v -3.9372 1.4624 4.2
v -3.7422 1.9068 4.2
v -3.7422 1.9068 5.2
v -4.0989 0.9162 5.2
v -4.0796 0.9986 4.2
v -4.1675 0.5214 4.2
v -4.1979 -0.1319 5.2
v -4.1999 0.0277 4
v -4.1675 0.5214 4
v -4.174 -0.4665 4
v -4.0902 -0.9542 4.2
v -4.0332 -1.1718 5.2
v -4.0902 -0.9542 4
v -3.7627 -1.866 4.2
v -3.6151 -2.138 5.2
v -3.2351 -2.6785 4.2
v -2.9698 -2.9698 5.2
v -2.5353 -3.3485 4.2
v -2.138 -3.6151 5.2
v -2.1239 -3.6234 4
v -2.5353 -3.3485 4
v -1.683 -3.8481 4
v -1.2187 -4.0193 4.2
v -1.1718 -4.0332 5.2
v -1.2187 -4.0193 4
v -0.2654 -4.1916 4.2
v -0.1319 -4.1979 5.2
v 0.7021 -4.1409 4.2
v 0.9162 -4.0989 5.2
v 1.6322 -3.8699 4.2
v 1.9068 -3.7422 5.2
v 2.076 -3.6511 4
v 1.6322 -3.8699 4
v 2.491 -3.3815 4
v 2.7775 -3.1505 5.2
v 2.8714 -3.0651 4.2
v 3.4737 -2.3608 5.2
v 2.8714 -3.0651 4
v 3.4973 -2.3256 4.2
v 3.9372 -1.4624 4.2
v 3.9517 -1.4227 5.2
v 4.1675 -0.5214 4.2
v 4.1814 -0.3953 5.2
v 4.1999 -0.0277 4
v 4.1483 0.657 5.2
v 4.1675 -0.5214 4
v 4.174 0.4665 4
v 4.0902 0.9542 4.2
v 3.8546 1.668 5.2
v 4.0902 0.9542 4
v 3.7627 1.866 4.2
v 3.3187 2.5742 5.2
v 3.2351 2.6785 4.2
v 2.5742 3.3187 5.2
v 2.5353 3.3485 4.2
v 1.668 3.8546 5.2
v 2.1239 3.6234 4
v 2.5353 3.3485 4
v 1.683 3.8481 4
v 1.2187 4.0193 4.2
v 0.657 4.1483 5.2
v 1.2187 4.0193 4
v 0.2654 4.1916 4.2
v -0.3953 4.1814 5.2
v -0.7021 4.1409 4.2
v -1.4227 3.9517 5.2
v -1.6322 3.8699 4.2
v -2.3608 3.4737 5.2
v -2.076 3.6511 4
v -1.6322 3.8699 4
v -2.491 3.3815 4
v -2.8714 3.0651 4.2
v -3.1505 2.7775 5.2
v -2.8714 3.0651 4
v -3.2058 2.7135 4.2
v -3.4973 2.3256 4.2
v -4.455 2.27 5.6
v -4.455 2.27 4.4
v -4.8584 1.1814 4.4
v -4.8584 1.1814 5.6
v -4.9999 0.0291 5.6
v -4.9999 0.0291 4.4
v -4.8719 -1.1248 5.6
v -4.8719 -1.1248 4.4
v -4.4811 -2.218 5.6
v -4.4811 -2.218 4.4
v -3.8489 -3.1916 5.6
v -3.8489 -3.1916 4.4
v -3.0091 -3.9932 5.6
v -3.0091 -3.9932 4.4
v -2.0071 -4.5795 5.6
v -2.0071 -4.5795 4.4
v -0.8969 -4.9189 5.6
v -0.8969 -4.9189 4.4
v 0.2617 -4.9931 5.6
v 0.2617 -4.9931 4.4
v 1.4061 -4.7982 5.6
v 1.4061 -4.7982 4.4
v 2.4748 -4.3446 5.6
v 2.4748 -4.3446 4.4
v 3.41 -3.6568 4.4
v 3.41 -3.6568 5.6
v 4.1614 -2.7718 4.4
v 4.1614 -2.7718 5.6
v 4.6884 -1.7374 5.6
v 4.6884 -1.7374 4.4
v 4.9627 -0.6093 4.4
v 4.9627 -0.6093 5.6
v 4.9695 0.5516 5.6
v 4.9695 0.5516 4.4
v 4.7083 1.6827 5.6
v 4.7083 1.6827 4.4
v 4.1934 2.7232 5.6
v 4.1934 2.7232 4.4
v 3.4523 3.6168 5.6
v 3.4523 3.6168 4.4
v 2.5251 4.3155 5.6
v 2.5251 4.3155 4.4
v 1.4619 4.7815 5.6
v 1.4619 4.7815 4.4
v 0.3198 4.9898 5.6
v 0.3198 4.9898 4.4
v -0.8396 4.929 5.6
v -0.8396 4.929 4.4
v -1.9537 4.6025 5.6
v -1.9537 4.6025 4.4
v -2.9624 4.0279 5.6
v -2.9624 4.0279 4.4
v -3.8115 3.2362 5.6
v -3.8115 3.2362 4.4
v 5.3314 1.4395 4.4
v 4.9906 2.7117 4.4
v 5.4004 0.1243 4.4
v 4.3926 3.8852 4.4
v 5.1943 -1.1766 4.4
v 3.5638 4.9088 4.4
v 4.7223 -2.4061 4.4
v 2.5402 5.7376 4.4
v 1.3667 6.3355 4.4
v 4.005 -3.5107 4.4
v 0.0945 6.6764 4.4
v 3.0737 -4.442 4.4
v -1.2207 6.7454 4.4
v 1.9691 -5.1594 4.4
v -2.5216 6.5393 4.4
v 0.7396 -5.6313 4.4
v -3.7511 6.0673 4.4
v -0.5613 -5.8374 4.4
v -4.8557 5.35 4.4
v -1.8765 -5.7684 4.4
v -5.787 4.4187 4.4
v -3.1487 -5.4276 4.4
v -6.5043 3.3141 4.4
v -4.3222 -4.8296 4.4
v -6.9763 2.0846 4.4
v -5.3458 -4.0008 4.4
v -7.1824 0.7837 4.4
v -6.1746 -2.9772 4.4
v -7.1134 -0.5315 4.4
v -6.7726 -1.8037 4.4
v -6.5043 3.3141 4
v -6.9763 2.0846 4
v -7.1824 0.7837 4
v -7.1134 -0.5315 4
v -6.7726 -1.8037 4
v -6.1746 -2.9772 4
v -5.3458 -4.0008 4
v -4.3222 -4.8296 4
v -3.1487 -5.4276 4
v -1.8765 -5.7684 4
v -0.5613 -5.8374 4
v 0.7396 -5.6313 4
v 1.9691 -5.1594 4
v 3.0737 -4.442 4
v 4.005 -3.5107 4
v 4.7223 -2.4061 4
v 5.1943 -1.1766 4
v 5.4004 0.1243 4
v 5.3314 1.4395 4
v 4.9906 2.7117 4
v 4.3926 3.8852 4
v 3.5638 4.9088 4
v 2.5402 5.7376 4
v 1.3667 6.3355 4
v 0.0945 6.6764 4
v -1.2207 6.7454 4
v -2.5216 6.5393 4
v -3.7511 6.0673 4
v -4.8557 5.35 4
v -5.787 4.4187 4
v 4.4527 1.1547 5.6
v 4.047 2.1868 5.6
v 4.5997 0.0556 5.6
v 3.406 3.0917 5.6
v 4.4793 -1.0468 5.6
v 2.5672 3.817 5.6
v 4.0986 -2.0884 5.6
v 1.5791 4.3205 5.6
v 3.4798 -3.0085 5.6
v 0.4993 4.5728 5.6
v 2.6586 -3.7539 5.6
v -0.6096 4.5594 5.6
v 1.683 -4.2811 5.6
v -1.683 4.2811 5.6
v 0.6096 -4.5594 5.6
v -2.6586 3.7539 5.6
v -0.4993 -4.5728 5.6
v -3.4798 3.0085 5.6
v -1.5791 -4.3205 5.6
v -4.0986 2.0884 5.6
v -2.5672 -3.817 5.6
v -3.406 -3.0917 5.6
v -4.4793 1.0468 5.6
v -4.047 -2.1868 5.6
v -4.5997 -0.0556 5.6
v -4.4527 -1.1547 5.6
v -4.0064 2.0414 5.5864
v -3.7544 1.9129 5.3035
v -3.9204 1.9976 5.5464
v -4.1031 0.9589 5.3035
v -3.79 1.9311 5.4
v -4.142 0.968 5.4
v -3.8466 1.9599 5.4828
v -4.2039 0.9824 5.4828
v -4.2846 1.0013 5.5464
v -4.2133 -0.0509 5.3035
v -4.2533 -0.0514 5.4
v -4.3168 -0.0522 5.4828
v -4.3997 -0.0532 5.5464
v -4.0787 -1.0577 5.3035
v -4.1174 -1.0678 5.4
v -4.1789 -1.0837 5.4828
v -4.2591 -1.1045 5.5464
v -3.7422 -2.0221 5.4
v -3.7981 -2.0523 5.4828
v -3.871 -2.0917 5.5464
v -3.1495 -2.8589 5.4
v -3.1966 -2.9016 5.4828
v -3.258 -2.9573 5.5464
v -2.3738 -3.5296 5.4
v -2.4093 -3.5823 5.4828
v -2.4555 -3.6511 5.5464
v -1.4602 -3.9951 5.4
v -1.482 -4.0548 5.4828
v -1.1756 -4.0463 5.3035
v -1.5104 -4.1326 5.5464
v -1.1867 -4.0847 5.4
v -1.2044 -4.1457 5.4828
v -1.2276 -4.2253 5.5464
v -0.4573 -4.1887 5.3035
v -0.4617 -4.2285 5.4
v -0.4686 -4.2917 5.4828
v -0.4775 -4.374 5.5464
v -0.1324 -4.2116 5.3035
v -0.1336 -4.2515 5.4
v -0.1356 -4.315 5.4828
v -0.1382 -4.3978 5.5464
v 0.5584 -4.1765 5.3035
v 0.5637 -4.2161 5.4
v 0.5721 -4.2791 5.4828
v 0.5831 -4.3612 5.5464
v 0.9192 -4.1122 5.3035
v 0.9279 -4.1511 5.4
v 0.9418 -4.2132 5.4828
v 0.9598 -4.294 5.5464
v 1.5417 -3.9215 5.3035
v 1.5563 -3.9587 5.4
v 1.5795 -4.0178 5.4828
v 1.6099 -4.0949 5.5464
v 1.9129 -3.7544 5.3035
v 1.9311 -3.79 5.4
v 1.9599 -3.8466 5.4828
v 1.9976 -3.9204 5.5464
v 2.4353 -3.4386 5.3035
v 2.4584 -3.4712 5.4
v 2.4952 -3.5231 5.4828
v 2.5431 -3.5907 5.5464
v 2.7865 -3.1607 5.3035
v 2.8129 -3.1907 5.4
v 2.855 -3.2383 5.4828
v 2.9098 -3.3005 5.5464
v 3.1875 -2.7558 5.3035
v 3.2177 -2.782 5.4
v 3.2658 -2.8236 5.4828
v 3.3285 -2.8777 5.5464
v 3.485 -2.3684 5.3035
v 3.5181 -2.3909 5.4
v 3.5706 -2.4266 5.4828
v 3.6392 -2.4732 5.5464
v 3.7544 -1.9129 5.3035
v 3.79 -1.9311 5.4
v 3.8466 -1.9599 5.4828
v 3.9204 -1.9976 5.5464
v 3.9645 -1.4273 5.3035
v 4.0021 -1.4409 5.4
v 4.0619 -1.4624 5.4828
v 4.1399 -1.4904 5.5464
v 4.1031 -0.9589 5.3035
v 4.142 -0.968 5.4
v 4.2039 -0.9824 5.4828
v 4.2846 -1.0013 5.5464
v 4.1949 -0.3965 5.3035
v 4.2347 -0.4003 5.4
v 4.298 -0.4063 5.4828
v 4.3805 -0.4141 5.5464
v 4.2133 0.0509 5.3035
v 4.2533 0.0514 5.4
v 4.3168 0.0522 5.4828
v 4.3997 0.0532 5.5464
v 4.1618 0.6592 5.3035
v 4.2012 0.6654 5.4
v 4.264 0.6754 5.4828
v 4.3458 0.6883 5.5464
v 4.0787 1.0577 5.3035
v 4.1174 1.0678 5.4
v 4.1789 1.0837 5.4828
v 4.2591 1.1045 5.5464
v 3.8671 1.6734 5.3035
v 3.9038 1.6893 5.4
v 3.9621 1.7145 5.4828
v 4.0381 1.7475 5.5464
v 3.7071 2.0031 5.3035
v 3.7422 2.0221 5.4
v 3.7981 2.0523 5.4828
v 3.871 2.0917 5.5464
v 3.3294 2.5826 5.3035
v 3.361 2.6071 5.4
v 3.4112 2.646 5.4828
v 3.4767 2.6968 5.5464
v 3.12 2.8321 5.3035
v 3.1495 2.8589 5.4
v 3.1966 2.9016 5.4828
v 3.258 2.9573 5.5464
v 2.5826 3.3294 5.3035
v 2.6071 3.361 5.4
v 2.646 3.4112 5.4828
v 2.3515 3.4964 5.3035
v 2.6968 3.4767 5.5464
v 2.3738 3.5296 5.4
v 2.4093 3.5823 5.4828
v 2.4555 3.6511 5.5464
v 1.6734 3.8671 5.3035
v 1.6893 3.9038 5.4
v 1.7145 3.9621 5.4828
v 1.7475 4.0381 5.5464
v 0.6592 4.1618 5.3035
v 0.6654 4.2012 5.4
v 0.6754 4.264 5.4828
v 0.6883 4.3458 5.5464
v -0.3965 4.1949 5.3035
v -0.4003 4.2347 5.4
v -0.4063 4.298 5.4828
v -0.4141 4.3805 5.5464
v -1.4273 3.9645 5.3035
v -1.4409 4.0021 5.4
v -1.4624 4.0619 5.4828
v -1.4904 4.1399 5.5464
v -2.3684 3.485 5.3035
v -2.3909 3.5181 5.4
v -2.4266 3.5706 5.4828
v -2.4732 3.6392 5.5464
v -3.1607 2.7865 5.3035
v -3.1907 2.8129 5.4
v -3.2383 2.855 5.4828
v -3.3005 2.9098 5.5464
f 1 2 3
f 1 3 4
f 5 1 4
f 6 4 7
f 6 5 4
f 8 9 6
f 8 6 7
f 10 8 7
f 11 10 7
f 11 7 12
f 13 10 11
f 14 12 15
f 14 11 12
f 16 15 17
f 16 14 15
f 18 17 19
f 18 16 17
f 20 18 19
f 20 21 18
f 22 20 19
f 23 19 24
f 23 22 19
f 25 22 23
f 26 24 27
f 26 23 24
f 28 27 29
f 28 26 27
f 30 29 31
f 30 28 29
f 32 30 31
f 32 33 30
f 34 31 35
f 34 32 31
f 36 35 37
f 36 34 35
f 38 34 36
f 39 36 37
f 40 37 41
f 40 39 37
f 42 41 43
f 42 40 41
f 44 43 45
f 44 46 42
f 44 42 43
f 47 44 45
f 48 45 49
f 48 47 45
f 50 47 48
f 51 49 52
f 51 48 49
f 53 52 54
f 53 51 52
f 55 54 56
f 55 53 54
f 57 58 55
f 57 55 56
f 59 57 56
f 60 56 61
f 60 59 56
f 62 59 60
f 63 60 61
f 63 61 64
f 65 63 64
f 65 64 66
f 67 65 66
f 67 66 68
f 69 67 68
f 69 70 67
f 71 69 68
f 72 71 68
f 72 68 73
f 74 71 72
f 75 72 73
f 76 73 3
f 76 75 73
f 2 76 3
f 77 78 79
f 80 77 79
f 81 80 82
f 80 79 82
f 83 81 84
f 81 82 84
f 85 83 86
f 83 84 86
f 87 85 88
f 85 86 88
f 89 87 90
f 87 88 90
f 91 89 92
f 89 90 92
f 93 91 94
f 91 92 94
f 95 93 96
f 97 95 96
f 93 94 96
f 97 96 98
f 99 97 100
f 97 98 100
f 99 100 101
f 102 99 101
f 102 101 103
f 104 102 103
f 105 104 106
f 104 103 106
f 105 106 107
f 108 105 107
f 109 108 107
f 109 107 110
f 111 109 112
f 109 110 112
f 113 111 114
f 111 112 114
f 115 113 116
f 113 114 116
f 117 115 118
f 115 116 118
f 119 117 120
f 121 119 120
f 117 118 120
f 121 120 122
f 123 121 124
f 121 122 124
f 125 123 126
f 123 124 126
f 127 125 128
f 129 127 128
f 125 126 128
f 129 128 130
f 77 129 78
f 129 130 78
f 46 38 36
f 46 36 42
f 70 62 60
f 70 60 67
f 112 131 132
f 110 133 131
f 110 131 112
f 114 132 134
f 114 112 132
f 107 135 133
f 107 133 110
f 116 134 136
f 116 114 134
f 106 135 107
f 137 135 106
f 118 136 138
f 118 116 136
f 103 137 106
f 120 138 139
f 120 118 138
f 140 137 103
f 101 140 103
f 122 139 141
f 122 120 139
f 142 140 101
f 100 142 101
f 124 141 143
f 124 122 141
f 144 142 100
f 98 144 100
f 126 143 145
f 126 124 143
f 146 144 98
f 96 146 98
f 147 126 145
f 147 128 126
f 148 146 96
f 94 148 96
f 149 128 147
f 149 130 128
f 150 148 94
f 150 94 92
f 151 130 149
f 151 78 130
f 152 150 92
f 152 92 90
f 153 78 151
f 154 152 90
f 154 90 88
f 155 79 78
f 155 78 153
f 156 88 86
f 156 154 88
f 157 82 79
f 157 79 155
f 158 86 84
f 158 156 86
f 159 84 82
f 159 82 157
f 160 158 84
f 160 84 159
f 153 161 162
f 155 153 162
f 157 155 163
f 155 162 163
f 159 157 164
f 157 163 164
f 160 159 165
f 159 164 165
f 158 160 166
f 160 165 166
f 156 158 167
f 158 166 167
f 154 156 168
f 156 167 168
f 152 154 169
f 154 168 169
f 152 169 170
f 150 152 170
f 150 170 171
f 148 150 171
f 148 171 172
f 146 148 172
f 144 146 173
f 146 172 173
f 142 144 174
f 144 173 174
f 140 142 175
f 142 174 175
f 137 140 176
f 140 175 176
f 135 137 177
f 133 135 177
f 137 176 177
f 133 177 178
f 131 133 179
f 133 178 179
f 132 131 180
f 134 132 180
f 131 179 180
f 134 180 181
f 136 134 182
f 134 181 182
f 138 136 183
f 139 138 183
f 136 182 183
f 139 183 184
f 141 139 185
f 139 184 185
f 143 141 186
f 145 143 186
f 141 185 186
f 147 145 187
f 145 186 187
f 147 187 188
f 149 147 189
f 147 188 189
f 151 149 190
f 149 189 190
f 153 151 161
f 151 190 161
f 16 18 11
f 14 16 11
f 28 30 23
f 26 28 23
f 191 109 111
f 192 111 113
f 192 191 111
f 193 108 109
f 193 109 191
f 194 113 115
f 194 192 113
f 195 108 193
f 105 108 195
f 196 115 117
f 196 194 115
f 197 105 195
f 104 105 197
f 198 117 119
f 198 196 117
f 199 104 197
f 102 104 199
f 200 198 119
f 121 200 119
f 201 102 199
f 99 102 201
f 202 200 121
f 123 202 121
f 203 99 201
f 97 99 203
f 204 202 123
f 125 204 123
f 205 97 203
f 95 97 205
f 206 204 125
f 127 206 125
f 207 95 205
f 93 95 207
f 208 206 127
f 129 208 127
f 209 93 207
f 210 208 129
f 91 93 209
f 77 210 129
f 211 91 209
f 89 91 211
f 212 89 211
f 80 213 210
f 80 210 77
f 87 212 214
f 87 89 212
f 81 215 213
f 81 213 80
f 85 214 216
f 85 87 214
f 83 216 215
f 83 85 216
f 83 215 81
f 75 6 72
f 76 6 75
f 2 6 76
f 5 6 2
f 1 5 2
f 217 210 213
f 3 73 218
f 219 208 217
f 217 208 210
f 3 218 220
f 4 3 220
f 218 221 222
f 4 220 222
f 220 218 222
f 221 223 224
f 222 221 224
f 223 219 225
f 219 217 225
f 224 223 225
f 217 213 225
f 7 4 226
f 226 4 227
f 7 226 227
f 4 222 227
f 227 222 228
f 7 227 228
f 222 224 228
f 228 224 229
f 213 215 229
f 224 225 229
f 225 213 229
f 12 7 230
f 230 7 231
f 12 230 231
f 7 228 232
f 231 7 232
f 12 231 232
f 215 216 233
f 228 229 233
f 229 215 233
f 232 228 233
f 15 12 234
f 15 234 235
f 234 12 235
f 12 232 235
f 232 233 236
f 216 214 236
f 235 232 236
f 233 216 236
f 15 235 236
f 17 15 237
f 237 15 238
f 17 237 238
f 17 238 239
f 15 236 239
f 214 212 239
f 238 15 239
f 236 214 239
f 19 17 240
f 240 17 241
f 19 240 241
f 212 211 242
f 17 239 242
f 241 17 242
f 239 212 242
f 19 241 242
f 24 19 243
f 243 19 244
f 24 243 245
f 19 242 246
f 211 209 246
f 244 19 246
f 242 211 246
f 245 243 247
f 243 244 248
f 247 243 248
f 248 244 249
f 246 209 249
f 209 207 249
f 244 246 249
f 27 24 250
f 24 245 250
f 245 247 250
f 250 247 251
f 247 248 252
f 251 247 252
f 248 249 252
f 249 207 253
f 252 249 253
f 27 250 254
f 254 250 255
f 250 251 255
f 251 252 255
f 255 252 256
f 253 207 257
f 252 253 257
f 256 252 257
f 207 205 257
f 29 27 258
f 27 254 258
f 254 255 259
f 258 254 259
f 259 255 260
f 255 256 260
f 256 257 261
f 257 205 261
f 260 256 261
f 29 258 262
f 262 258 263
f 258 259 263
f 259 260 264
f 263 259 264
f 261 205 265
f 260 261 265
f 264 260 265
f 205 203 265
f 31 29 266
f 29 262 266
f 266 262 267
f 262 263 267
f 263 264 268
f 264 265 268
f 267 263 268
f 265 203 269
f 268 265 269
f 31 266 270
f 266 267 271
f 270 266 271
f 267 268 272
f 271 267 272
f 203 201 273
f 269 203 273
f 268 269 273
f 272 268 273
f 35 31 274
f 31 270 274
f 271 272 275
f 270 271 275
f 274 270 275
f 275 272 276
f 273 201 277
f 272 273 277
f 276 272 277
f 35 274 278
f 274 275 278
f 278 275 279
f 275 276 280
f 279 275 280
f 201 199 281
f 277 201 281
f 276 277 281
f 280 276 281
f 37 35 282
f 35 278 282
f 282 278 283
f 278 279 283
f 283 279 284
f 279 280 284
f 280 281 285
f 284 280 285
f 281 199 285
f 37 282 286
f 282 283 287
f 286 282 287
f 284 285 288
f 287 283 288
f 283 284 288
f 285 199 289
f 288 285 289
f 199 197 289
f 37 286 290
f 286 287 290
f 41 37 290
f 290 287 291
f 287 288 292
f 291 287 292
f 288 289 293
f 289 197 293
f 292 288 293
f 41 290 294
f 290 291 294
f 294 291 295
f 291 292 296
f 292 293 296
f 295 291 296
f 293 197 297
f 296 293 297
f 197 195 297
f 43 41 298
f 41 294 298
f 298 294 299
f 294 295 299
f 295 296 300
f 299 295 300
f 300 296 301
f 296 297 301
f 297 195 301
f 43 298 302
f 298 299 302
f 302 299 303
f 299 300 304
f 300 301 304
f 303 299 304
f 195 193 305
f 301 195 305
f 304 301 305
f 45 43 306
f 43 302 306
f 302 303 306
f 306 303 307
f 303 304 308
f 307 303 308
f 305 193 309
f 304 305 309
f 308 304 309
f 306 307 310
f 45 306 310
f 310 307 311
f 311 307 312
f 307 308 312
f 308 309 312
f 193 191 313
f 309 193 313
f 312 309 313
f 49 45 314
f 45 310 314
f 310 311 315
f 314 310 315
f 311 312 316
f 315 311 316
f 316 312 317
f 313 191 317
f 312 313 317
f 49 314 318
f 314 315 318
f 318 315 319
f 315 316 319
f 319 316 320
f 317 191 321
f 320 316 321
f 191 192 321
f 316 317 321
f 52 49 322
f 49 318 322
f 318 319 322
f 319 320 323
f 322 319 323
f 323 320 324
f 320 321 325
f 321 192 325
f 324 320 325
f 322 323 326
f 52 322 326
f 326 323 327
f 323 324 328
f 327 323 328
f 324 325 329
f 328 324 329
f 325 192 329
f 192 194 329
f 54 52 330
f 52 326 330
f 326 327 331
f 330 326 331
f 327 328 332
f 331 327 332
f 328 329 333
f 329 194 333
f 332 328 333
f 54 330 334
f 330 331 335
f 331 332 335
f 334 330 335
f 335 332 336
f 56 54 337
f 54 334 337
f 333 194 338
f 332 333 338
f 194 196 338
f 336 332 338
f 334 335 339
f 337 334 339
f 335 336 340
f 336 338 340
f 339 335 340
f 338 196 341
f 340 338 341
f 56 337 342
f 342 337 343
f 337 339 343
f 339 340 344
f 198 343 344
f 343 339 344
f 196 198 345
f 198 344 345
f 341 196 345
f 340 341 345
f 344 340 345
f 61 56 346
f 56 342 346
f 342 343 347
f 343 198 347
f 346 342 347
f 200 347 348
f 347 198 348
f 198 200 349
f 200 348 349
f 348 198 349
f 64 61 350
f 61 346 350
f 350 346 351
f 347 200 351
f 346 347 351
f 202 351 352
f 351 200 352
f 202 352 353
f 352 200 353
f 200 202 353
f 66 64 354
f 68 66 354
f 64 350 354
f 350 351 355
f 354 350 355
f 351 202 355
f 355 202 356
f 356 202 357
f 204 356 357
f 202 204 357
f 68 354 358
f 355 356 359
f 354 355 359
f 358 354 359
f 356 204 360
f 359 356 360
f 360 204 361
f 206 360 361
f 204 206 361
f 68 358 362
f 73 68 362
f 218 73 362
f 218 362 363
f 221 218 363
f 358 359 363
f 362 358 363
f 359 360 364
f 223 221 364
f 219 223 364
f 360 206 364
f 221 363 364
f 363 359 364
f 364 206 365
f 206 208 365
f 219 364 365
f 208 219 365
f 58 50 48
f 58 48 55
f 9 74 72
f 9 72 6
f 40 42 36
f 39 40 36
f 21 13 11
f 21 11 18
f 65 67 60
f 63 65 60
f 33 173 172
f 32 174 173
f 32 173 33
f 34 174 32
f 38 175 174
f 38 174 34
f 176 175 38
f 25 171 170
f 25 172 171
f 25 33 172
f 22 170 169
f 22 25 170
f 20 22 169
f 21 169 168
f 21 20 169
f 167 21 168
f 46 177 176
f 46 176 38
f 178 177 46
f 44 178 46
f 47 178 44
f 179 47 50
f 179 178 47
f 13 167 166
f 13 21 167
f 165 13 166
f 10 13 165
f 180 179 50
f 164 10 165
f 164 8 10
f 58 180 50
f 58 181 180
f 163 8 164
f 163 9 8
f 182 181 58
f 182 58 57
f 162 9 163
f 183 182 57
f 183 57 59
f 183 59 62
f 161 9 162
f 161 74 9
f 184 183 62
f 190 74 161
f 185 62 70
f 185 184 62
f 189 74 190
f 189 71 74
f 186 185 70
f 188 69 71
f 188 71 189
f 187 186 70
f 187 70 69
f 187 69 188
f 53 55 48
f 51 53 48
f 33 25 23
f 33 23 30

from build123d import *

# Parameters (mm, degrees)
SKETCH044_R             = 6.3
SKETCH044_R_2           = 4.2
PAD022_DEPTH            = 0.4
SKETCH049_R             = 5
SKETCH049_R_2           = 4.2
PAD027_DEPTH            = 1.2
PAD037_DEPTH            = 0.2
POLARPATTERN_COUNT      = 6
FILLET002_R             = 0.4
BODY009_PLACEMENT_ANGLE = 153


with BuildPart() as part:
    # Sketch044 → Pad022 (new body)
    with BuildSketch(Plane.XY):
        with Locations((1, 0)):
            Circle(SKETCH044_R)
        Circle(SKETCH044_R_2, mode=Mode.SUBTRACT)
    extrude(amount=PAD022_DEPTH)

    # Sketch049 (on Face4 of Pad022) → Pad027 (join)
    with BuildSketch(Plane.XY.offset(0.4)):
        Circle(SKETCH049_R)
        Circle(SKETCH049_R_2, mode=Mode.SUBTRACT)
    extrude(amount=PAD027_DEPTH)

    # Sketch074 (on Face2 of Pad027) → Pad037 (join)
    with BuildSketch(Plane(origin=(0, 0, 0), x_dir=(1, 0, 0), z_dir=(0, 0, -1))):
        with BuildLine():
            ThreePointArc((3.95, -1.4274102424), (4.2, 0), (3.95, 1.4274102424))
            Line((3.95, 1.4274102424), (3.95, -1.4274102424))
        make_face()
    pad037 = extrude(amount=-PAD037_DEPTH)

    # PolarPattern: Pad037 ×6 about axis
    polarpattern_axis = Axis((0, 0, 0), (0, 0, -1))
    for i in range(1, POLARPATTERN_COUNT):
        add(pad037.rotate(polarpattern_axis, i * 360 / POLARPATTERN_COUNT))

    # Fillet002
    fillet002_edges = [part.edges().sort_by_distance(p)[0] for p in [
        (-4.2, 0, 1.6),
    ]]
    fillet(fillet002_edges, radius=FILLET002_R)


with BuildPart() as part_1:
    # Body009 placement: moved
    add(part.part.moved(Location((0, 0, 4))).rotate(Axis((0, 0, 4), (0, 0, 1)), BODY009_PLACEMENT_ANGLE))


solid = part_1.part
